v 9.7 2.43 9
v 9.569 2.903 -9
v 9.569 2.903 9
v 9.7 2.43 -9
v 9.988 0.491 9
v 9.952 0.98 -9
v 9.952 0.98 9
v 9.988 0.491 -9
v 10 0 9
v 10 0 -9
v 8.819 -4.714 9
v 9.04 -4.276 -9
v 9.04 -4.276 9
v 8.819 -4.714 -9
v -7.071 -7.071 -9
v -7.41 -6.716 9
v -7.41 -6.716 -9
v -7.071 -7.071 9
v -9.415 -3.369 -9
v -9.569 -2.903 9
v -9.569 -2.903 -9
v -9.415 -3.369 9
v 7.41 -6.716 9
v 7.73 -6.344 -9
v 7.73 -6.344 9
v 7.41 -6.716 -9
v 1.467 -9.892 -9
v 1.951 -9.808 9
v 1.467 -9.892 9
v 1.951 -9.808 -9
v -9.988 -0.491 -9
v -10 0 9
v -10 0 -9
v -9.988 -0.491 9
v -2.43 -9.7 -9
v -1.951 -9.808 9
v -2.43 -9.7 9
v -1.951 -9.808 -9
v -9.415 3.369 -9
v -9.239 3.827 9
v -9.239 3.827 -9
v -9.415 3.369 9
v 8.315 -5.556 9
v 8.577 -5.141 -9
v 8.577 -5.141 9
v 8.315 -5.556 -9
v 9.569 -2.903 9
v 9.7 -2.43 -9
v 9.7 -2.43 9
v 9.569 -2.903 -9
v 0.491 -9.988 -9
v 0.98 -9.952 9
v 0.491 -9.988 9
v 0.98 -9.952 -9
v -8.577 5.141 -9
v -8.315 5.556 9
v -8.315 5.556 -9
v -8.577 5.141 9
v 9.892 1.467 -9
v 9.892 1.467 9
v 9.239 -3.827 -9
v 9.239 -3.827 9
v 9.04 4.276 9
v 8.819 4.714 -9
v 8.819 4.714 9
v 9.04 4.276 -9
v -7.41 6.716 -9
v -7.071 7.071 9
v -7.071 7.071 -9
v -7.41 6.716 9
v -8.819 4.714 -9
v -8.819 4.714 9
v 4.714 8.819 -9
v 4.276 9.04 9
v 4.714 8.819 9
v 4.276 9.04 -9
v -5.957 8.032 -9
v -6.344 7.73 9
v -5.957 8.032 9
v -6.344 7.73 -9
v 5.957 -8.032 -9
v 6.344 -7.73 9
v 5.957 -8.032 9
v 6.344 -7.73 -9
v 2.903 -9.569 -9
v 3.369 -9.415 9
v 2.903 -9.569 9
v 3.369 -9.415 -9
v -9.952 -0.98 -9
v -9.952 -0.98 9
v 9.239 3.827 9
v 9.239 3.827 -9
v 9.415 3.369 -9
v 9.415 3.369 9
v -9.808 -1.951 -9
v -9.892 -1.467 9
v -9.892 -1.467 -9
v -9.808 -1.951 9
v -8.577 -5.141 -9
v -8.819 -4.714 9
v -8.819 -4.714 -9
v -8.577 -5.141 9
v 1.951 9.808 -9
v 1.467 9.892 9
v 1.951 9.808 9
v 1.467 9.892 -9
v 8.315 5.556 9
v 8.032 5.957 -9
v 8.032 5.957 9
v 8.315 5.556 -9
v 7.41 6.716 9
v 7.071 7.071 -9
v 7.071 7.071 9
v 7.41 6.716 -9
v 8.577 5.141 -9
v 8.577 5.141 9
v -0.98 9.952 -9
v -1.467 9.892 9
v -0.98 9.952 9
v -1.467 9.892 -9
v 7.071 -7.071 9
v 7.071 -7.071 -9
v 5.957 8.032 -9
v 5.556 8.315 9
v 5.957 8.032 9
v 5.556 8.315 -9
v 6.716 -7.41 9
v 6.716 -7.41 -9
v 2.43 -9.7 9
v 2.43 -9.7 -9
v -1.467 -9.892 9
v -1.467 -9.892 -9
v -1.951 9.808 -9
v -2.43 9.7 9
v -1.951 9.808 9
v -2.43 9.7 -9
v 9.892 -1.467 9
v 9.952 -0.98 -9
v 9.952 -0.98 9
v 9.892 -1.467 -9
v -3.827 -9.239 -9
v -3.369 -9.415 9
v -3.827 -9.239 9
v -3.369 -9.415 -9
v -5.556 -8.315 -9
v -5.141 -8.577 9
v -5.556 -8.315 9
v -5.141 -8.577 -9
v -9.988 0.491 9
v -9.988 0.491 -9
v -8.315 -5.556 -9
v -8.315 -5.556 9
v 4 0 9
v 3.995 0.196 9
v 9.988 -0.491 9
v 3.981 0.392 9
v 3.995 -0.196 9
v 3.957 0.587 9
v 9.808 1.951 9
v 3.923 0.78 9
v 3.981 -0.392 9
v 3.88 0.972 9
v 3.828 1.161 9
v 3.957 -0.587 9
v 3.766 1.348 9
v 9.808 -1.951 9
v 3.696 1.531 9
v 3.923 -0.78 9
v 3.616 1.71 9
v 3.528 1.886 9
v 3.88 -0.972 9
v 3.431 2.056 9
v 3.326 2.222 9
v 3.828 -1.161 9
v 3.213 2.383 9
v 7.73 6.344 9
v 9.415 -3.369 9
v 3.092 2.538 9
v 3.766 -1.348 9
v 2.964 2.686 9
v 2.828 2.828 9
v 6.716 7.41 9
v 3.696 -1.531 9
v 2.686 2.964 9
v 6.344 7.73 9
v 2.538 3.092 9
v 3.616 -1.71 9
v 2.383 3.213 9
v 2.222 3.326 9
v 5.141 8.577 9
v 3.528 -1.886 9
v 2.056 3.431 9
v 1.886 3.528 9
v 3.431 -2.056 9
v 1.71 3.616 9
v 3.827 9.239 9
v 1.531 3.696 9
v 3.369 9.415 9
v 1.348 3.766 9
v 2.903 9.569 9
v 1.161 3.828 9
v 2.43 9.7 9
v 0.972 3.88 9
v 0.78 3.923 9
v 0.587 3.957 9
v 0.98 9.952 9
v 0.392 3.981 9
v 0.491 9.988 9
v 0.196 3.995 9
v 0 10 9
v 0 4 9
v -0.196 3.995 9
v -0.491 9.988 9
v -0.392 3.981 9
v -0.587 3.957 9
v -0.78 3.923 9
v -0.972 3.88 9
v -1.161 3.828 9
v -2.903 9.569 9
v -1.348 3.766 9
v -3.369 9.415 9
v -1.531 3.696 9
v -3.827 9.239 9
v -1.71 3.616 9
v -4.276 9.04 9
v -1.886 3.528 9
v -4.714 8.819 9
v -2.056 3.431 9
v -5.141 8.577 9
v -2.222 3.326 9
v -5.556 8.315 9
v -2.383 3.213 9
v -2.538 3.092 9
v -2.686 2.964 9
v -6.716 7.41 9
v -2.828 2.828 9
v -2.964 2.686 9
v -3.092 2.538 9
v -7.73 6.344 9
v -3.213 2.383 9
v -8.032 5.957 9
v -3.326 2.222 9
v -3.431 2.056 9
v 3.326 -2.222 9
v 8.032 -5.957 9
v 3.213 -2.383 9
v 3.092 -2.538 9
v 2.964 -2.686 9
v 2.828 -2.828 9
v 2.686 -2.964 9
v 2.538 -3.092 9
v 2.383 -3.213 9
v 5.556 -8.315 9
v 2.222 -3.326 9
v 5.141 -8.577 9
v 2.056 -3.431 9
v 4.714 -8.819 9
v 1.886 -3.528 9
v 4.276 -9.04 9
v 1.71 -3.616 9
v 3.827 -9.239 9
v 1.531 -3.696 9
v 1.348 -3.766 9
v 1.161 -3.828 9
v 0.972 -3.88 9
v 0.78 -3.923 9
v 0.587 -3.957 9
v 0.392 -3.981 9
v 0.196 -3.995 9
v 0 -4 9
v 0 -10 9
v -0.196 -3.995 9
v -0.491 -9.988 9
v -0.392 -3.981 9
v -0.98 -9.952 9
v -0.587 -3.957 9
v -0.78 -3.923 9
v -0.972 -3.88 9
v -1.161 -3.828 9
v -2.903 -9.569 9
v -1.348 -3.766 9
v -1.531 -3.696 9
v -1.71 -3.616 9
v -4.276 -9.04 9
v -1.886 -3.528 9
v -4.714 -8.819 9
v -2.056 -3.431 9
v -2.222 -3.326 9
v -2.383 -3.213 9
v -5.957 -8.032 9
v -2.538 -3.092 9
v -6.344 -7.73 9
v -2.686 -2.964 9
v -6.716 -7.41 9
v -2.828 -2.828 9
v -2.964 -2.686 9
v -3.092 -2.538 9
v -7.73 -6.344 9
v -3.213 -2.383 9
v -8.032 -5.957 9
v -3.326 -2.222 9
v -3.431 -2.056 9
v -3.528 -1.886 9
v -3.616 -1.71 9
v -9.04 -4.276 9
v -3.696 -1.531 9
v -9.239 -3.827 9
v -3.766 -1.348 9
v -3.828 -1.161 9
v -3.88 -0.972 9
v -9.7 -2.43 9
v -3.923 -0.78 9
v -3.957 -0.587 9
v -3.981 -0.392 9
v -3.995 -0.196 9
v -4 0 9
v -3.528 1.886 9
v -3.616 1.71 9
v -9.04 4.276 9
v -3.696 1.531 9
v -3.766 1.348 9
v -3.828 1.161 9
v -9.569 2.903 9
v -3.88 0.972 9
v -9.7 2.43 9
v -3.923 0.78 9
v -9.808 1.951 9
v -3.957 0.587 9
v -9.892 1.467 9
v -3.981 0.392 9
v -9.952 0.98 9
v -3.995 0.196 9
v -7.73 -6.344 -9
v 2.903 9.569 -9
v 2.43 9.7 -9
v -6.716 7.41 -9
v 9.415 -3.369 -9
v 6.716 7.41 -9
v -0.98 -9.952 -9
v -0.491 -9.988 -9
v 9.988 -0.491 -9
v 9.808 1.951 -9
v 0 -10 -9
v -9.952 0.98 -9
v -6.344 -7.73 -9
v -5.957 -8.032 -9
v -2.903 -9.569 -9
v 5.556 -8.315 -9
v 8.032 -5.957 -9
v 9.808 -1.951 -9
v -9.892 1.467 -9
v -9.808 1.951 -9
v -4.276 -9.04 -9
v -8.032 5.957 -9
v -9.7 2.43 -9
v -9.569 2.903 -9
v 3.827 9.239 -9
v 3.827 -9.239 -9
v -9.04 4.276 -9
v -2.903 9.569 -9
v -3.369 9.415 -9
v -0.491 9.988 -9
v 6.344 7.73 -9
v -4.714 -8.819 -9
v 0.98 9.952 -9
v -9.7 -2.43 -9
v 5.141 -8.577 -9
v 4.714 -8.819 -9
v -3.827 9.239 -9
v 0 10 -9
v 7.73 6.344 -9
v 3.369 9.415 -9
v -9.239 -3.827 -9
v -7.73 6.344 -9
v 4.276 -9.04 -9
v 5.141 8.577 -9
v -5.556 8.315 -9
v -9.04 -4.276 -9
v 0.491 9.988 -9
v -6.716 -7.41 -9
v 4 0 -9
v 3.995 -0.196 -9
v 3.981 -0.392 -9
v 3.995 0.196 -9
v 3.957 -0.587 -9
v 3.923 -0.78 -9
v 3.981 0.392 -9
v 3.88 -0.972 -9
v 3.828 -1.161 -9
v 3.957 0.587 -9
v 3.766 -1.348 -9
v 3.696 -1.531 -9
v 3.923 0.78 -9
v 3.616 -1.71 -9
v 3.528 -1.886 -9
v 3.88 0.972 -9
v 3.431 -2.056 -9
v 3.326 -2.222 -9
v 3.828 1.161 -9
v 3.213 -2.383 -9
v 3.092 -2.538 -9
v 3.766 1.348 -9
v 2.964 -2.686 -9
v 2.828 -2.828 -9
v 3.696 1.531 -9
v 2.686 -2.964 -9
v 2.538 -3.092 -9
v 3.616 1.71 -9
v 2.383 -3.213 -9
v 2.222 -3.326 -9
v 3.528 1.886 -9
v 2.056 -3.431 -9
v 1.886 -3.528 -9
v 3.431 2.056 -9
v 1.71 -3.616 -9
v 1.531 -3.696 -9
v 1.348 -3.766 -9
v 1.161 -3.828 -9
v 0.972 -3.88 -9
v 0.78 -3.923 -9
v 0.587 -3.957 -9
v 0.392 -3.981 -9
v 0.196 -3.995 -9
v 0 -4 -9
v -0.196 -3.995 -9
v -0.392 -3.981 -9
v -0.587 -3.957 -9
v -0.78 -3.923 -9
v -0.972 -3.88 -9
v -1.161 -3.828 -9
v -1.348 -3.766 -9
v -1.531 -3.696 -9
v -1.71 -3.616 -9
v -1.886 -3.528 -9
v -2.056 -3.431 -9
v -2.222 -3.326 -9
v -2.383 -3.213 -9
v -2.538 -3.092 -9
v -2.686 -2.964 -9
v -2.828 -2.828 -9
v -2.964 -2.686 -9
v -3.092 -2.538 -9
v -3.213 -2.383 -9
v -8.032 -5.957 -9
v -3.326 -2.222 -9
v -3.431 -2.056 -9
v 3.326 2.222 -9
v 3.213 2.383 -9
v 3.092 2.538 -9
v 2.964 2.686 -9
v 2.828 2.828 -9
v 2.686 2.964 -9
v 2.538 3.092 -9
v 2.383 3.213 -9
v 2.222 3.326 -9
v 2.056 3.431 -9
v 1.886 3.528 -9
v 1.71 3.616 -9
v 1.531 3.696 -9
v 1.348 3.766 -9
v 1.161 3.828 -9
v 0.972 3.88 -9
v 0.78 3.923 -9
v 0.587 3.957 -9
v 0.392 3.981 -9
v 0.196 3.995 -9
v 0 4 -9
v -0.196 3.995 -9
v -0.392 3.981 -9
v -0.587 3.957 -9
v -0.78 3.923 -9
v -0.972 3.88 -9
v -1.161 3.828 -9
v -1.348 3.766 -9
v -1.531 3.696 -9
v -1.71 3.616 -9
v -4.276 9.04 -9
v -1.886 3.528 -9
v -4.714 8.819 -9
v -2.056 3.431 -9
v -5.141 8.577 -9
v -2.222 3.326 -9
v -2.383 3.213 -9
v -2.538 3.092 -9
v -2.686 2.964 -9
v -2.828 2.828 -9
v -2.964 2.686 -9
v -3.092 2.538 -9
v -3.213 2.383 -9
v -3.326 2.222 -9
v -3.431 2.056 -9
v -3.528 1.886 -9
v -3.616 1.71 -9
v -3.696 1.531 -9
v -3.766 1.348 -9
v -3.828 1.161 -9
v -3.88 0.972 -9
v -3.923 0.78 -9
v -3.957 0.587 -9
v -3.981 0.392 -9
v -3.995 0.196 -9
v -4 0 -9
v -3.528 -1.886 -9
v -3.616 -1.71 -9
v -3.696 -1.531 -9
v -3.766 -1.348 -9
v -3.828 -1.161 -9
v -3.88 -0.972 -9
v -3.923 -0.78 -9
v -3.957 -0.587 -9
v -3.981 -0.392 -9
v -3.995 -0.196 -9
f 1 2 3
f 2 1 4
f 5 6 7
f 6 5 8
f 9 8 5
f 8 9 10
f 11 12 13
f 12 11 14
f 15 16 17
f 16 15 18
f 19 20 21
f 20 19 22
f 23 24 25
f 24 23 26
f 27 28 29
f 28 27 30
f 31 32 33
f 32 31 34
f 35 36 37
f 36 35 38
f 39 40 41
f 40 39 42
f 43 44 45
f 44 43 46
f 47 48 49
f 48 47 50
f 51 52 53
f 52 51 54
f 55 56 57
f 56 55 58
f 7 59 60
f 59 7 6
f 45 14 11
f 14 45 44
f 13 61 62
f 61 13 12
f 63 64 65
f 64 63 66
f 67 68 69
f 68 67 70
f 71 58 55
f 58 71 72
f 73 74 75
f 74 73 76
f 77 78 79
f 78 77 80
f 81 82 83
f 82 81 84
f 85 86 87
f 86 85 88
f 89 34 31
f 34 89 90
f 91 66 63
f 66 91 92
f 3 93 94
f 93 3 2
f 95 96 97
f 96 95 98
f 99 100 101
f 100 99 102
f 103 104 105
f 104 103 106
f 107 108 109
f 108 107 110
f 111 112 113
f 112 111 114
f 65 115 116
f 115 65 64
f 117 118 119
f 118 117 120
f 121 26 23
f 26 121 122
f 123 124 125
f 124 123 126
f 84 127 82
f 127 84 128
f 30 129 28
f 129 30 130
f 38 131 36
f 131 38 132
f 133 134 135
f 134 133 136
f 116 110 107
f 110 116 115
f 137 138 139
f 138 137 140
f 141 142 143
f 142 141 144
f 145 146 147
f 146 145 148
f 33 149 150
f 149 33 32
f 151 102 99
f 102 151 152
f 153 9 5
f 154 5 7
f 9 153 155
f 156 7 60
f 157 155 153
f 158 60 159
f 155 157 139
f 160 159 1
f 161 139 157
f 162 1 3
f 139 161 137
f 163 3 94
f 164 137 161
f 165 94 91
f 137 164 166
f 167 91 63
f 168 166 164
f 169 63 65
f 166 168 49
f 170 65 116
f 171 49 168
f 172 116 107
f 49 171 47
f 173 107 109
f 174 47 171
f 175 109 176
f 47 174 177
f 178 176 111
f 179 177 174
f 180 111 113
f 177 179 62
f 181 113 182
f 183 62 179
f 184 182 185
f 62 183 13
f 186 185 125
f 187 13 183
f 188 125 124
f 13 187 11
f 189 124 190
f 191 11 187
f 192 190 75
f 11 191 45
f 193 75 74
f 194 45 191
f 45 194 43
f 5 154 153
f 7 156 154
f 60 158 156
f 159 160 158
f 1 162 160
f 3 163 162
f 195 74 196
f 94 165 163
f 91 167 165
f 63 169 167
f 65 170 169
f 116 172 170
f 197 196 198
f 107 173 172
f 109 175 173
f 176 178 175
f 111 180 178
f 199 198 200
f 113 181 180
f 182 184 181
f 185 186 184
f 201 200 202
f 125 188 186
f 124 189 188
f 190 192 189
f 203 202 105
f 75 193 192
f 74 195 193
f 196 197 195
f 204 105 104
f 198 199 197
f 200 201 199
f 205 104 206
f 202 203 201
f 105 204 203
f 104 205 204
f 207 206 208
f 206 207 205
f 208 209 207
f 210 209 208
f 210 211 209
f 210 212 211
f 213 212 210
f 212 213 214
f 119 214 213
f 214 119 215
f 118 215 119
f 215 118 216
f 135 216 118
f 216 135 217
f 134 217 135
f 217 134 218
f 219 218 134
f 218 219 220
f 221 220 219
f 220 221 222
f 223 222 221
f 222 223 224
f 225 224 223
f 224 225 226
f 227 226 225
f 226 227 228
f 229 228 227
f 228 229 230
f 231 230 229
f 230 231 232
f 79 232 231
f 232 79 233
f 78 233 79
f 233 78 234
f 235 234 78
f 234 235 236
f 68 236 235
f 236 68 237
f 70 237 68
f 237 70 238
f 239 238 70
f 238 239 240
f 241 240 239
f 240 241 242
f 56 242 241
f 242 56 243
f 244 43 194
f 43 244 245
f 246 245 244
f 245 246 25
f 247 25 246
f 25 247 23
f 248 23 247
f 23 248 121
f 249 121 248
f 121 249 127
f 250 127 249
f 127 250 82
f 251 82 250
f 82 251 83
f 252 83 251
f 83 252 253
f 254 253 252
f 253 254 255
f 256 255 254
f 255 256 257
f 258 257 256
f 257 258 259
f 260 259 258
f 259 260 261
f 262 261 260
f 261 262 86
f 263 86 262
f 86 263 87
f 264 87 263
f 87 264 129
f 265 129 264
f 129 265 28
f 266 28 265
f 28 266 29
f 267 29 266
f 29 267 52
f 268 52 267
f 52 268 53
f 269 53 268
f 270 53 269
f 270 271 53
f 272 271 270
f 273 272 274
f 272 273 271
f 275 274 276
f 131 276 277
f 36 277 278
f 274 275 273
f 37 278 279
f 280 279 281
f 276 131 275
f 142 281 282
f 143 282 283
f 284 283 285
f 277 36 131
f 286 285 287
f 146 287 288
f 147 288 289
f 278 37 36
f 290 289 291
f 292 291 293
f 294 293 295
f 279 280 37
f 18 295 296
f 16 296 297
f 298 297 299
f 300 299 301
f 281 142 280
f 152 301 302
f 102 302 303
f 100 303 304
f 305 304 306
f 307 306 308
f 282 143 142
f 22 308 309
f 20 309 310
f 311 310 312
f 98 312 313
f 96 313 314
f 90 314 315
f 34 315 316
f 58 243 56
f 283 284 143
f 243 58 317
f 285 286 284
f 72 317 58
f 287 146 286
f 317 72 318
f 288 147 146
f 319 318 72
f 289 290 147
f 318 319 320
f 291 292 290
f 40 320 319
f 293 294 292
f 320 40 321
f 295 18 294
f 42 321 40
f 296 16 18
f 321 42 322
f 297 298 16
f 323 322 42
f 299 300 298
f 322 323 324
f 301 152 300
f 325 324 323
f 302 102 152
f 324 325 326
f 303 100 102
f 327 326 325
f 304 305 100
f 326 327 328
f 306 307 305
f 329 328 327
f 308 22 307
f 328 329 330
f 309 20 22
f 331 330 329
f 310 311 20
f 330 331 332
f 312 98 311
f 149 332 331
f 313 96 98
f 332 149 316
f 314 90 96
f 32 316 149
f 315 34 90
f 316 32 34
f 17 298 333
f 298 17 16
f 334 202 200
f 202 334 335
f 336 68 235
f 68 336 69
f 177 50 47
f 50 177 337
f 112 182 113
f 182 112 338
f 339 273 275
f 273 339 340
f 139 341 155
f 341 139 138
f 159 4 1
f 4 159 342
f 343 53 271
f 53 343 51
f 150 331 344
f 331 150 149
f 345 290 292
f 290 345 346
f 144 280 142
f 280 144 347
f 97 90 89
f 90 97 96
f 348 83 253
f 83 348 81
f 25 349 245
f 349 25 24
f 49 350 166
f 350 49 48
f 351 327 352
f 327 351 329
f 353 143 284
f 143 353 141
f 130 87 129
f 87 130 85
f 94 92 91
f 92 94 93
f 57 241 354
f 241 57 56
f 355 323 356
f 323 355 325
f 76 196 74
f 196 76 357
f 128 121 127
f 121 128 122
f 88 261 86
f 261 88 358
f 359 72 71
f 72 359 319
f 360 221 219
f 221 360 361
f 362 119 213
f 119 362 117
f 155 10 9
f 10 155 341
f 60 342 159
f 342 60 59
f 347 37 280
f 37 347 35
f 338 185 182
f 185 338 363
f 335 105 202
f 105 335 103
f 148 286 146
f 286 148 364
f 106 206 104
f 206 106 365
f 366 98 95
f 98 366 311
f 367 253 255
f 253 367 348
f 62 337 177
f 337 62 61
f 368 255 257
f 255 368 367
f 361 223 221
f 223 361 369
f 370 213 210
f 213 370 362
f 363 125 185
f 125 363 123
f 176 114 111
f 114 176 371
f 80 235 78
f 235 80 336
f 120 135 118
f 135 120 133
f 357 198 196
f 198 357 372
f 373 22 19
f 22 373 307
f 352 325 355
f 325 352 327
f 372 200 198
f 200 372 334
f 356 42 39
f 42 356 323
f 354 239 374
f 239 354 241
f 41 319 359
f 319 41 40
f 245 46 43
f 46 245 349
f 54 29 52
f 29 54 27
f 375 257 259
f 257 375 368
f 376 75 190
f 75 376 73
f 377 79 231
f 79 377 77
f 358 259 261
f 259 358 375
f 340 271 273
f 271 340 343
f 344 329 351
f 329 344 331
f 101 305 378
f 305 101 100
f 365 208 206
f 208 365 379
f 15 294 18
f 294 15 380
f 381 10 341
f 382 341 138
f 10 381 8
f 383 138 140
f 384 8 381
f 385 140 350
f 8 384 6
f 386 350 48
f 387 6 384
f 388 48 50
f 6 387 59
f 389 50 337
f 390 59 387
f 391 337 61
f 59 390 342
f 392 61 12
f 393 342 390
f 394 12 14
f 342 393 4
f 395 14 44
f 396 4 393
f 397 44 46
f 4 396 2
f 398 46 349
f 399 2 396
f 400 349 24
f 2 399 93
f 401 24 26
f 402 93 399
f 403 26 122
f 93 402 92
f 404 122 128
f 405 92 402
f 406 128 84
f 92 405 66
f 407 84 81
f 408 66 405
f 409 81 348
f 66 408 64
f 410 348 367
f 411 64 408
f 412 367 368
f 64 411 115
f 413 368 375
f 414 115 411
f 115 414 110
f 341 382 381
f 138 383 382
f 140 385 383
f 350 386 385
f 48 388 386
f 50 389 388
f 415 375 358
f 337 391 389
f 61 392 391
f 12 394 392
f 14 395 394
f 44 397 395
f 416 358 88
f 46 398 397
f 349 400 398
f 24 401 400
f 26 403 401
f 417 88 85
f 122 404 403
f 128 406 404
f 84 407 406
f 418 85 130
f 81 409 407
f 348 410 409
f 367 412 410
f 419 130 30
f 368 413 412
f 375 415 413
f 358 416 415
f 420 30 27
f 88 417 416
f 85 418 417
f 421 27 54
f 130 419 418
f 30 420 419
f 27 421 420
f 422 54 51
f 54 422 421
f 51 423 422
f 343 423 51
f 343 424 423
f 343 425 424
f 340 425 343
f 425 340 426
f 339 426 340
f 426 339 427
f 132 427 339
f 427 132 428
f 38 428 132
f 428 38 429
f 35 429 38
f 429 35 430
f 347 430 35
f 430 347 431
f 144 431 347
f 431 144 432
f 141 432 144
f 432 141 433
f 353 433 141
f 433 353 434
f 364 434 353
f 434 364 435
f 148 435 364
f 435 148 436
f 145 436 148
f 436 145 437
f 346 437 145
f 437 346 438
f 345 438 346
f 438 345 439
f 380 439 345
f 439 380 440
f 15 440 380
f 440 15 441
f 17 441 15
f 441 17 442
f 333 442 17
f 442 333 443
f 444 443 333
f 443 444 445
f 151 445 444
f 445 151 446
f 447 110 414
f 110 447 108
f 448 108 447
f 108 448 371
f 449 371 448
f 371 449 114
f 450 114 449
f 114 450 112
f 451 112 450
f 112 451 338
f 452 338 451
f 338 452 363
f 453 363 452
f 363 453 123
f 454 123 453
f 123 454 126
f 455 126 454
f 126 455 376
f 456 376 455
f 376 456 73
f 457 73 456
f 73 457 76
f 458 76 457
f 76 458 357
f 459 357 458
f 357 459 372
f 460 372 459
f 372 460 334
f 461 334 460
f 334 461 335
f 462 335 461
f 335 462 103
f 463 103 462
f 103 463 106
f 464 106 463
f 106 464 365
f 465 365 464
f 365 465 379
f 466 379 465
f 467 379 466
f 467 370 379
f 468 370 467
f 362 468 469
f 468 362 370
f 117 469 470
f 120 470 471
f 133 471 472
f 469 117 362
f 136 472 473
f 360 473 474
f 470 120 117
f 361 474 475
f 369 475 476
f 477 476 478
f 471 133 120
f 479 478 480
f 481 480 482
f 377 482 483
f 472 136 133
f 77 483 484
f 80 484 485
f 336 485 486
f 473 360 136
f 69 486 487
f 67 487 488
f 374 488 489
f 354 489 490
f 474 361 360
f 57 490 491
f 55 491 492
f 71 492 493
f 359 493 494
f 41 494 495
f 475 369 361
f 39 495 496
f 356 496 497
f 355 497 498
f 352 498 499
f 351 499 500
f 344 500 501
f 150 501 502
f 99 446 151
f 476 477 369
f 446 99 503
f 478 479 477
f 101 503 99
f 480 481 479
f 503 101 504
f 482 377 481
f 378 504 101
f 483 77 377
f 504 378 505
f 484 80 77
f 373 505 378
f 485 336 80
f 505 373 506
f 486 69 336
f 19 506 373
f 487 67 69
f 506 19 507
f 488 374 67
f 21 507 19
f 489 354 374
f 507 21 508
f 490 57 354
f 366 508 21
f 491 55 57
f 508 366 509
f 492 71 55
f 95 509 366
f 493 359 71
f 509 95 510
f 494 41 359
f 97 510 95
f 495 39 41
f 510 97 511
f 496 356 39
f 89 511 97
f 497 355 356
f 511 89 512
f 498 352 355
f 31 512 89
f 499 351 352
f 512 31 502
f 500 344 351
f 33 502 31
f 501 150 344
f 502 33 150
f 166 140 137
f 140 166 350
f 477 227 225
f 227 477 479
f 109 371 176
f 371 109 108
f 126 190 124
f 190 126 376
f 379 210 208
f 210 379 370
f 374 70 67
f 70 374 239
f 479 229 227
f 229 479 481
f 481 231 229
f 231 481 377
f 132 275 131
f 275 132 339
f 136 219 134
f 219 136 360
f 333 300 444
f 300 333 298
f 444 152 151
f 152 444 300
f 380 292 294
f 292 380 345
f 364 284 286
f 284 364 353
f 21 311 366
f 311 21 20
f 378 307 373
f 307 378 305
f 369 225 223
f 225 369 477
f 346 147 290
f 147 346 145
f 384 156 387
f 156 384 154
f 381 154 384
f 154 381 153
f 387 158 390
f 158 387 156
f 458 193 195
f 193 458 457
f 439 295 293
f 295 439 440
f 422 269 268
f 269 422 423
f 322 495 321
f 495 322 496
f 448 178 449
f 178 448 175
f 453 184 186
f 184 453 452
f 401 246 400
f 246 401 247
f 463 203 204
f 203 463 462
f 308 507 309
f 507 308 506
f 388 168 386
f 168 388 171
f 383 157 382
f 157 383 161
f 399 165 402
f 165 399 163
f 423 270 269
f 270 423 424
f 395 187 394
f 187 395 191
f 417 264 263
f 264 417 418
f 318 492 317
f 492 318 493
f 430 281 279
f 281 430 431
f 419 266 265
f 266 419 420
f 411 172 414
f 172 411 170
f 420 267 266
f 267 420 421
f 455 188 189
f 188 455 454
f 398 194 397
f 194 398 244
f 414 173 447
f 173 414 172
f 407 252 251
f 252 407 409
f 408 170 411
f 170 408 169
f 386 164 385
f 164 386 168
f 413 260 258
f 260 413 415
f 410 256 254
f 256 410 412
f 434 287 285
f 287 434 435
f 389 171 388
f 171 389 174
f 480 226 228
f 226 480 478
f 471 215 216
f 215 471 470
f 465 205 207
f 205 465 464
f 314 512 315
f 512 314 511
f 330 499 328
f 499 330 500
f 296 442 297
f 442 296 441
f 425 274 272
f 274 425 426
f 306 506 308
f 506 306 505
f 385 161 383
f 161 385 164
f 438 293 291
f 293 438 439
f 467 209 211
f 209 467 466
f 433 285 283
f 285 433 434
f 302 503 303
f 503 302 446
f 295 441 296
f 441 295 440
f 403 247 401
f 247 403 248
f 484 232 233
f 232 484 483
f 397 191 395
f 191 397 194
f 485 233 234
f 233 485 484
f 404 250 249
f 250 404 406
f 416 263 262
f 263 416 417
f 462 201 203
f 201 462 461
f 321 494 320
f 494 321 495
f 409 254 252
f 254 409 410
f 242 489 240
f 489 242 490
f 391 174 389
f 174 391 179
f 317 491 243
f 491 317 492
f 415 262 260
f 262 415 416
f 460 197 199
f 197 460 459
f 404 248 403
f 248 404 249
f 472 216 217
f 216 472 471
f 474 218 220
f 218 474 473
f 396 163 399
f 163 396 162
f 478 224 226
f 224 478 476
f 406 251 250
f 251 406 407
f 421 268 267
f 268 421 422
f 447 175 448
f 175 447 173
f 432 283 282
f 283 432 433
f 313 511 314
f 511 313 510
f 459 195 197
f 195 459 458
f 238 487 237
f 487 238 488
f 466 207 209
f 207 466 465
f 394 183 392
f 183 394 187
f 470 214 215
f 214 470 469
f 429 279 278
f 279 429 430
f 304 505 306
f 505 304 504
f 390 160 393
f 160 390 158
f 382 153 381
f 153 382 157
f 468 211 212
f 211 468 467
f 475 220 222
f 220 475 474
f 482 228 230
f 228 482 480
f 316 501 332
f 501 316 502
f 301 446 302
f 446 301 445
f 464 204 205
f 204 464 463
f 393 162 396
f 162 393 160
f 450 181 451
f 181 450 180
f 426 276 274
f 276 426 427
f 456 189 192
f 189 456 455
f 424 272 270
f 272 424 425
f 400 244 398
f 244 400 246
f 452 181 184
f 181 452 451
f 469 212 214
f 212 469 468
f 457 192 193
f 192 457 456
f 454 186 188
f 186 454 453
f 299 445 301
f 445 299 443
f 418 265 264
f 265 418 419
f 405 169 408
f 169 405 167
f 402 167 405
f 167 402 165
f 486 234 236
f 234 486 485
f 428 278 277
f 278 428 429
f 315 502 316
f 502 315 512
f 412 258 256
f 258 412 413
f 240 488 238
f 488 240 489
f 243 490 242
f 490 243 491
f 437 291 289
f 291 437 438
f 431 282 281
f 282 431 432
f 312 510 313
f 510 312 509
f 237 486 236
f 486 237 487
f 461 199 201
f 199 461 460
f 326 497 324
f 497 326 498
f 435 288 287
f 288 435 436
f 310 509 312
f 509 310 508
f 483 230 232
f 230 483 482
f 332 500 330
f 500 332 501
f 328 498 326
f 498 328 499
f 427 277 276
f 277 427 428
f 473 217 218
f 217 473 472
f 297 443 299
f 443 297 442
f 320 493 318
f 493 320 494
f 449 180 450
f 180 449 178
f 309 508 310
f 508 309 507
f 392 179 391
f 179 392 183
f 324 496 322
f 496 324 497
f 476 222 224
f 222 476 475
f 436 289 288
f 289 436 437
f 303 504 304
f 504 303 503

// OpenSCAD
$fn=128;

outer_d = 20.0;
height  = 18.0;
hole_d  = 8.0;

module washer(od, h, id){
    difference(){
        cylinder(d=od, h=h, center=true);
        cylinder(d=id, h=h+0.2, center=true);
    }
}

washer(outer_d, height, hole_d);
